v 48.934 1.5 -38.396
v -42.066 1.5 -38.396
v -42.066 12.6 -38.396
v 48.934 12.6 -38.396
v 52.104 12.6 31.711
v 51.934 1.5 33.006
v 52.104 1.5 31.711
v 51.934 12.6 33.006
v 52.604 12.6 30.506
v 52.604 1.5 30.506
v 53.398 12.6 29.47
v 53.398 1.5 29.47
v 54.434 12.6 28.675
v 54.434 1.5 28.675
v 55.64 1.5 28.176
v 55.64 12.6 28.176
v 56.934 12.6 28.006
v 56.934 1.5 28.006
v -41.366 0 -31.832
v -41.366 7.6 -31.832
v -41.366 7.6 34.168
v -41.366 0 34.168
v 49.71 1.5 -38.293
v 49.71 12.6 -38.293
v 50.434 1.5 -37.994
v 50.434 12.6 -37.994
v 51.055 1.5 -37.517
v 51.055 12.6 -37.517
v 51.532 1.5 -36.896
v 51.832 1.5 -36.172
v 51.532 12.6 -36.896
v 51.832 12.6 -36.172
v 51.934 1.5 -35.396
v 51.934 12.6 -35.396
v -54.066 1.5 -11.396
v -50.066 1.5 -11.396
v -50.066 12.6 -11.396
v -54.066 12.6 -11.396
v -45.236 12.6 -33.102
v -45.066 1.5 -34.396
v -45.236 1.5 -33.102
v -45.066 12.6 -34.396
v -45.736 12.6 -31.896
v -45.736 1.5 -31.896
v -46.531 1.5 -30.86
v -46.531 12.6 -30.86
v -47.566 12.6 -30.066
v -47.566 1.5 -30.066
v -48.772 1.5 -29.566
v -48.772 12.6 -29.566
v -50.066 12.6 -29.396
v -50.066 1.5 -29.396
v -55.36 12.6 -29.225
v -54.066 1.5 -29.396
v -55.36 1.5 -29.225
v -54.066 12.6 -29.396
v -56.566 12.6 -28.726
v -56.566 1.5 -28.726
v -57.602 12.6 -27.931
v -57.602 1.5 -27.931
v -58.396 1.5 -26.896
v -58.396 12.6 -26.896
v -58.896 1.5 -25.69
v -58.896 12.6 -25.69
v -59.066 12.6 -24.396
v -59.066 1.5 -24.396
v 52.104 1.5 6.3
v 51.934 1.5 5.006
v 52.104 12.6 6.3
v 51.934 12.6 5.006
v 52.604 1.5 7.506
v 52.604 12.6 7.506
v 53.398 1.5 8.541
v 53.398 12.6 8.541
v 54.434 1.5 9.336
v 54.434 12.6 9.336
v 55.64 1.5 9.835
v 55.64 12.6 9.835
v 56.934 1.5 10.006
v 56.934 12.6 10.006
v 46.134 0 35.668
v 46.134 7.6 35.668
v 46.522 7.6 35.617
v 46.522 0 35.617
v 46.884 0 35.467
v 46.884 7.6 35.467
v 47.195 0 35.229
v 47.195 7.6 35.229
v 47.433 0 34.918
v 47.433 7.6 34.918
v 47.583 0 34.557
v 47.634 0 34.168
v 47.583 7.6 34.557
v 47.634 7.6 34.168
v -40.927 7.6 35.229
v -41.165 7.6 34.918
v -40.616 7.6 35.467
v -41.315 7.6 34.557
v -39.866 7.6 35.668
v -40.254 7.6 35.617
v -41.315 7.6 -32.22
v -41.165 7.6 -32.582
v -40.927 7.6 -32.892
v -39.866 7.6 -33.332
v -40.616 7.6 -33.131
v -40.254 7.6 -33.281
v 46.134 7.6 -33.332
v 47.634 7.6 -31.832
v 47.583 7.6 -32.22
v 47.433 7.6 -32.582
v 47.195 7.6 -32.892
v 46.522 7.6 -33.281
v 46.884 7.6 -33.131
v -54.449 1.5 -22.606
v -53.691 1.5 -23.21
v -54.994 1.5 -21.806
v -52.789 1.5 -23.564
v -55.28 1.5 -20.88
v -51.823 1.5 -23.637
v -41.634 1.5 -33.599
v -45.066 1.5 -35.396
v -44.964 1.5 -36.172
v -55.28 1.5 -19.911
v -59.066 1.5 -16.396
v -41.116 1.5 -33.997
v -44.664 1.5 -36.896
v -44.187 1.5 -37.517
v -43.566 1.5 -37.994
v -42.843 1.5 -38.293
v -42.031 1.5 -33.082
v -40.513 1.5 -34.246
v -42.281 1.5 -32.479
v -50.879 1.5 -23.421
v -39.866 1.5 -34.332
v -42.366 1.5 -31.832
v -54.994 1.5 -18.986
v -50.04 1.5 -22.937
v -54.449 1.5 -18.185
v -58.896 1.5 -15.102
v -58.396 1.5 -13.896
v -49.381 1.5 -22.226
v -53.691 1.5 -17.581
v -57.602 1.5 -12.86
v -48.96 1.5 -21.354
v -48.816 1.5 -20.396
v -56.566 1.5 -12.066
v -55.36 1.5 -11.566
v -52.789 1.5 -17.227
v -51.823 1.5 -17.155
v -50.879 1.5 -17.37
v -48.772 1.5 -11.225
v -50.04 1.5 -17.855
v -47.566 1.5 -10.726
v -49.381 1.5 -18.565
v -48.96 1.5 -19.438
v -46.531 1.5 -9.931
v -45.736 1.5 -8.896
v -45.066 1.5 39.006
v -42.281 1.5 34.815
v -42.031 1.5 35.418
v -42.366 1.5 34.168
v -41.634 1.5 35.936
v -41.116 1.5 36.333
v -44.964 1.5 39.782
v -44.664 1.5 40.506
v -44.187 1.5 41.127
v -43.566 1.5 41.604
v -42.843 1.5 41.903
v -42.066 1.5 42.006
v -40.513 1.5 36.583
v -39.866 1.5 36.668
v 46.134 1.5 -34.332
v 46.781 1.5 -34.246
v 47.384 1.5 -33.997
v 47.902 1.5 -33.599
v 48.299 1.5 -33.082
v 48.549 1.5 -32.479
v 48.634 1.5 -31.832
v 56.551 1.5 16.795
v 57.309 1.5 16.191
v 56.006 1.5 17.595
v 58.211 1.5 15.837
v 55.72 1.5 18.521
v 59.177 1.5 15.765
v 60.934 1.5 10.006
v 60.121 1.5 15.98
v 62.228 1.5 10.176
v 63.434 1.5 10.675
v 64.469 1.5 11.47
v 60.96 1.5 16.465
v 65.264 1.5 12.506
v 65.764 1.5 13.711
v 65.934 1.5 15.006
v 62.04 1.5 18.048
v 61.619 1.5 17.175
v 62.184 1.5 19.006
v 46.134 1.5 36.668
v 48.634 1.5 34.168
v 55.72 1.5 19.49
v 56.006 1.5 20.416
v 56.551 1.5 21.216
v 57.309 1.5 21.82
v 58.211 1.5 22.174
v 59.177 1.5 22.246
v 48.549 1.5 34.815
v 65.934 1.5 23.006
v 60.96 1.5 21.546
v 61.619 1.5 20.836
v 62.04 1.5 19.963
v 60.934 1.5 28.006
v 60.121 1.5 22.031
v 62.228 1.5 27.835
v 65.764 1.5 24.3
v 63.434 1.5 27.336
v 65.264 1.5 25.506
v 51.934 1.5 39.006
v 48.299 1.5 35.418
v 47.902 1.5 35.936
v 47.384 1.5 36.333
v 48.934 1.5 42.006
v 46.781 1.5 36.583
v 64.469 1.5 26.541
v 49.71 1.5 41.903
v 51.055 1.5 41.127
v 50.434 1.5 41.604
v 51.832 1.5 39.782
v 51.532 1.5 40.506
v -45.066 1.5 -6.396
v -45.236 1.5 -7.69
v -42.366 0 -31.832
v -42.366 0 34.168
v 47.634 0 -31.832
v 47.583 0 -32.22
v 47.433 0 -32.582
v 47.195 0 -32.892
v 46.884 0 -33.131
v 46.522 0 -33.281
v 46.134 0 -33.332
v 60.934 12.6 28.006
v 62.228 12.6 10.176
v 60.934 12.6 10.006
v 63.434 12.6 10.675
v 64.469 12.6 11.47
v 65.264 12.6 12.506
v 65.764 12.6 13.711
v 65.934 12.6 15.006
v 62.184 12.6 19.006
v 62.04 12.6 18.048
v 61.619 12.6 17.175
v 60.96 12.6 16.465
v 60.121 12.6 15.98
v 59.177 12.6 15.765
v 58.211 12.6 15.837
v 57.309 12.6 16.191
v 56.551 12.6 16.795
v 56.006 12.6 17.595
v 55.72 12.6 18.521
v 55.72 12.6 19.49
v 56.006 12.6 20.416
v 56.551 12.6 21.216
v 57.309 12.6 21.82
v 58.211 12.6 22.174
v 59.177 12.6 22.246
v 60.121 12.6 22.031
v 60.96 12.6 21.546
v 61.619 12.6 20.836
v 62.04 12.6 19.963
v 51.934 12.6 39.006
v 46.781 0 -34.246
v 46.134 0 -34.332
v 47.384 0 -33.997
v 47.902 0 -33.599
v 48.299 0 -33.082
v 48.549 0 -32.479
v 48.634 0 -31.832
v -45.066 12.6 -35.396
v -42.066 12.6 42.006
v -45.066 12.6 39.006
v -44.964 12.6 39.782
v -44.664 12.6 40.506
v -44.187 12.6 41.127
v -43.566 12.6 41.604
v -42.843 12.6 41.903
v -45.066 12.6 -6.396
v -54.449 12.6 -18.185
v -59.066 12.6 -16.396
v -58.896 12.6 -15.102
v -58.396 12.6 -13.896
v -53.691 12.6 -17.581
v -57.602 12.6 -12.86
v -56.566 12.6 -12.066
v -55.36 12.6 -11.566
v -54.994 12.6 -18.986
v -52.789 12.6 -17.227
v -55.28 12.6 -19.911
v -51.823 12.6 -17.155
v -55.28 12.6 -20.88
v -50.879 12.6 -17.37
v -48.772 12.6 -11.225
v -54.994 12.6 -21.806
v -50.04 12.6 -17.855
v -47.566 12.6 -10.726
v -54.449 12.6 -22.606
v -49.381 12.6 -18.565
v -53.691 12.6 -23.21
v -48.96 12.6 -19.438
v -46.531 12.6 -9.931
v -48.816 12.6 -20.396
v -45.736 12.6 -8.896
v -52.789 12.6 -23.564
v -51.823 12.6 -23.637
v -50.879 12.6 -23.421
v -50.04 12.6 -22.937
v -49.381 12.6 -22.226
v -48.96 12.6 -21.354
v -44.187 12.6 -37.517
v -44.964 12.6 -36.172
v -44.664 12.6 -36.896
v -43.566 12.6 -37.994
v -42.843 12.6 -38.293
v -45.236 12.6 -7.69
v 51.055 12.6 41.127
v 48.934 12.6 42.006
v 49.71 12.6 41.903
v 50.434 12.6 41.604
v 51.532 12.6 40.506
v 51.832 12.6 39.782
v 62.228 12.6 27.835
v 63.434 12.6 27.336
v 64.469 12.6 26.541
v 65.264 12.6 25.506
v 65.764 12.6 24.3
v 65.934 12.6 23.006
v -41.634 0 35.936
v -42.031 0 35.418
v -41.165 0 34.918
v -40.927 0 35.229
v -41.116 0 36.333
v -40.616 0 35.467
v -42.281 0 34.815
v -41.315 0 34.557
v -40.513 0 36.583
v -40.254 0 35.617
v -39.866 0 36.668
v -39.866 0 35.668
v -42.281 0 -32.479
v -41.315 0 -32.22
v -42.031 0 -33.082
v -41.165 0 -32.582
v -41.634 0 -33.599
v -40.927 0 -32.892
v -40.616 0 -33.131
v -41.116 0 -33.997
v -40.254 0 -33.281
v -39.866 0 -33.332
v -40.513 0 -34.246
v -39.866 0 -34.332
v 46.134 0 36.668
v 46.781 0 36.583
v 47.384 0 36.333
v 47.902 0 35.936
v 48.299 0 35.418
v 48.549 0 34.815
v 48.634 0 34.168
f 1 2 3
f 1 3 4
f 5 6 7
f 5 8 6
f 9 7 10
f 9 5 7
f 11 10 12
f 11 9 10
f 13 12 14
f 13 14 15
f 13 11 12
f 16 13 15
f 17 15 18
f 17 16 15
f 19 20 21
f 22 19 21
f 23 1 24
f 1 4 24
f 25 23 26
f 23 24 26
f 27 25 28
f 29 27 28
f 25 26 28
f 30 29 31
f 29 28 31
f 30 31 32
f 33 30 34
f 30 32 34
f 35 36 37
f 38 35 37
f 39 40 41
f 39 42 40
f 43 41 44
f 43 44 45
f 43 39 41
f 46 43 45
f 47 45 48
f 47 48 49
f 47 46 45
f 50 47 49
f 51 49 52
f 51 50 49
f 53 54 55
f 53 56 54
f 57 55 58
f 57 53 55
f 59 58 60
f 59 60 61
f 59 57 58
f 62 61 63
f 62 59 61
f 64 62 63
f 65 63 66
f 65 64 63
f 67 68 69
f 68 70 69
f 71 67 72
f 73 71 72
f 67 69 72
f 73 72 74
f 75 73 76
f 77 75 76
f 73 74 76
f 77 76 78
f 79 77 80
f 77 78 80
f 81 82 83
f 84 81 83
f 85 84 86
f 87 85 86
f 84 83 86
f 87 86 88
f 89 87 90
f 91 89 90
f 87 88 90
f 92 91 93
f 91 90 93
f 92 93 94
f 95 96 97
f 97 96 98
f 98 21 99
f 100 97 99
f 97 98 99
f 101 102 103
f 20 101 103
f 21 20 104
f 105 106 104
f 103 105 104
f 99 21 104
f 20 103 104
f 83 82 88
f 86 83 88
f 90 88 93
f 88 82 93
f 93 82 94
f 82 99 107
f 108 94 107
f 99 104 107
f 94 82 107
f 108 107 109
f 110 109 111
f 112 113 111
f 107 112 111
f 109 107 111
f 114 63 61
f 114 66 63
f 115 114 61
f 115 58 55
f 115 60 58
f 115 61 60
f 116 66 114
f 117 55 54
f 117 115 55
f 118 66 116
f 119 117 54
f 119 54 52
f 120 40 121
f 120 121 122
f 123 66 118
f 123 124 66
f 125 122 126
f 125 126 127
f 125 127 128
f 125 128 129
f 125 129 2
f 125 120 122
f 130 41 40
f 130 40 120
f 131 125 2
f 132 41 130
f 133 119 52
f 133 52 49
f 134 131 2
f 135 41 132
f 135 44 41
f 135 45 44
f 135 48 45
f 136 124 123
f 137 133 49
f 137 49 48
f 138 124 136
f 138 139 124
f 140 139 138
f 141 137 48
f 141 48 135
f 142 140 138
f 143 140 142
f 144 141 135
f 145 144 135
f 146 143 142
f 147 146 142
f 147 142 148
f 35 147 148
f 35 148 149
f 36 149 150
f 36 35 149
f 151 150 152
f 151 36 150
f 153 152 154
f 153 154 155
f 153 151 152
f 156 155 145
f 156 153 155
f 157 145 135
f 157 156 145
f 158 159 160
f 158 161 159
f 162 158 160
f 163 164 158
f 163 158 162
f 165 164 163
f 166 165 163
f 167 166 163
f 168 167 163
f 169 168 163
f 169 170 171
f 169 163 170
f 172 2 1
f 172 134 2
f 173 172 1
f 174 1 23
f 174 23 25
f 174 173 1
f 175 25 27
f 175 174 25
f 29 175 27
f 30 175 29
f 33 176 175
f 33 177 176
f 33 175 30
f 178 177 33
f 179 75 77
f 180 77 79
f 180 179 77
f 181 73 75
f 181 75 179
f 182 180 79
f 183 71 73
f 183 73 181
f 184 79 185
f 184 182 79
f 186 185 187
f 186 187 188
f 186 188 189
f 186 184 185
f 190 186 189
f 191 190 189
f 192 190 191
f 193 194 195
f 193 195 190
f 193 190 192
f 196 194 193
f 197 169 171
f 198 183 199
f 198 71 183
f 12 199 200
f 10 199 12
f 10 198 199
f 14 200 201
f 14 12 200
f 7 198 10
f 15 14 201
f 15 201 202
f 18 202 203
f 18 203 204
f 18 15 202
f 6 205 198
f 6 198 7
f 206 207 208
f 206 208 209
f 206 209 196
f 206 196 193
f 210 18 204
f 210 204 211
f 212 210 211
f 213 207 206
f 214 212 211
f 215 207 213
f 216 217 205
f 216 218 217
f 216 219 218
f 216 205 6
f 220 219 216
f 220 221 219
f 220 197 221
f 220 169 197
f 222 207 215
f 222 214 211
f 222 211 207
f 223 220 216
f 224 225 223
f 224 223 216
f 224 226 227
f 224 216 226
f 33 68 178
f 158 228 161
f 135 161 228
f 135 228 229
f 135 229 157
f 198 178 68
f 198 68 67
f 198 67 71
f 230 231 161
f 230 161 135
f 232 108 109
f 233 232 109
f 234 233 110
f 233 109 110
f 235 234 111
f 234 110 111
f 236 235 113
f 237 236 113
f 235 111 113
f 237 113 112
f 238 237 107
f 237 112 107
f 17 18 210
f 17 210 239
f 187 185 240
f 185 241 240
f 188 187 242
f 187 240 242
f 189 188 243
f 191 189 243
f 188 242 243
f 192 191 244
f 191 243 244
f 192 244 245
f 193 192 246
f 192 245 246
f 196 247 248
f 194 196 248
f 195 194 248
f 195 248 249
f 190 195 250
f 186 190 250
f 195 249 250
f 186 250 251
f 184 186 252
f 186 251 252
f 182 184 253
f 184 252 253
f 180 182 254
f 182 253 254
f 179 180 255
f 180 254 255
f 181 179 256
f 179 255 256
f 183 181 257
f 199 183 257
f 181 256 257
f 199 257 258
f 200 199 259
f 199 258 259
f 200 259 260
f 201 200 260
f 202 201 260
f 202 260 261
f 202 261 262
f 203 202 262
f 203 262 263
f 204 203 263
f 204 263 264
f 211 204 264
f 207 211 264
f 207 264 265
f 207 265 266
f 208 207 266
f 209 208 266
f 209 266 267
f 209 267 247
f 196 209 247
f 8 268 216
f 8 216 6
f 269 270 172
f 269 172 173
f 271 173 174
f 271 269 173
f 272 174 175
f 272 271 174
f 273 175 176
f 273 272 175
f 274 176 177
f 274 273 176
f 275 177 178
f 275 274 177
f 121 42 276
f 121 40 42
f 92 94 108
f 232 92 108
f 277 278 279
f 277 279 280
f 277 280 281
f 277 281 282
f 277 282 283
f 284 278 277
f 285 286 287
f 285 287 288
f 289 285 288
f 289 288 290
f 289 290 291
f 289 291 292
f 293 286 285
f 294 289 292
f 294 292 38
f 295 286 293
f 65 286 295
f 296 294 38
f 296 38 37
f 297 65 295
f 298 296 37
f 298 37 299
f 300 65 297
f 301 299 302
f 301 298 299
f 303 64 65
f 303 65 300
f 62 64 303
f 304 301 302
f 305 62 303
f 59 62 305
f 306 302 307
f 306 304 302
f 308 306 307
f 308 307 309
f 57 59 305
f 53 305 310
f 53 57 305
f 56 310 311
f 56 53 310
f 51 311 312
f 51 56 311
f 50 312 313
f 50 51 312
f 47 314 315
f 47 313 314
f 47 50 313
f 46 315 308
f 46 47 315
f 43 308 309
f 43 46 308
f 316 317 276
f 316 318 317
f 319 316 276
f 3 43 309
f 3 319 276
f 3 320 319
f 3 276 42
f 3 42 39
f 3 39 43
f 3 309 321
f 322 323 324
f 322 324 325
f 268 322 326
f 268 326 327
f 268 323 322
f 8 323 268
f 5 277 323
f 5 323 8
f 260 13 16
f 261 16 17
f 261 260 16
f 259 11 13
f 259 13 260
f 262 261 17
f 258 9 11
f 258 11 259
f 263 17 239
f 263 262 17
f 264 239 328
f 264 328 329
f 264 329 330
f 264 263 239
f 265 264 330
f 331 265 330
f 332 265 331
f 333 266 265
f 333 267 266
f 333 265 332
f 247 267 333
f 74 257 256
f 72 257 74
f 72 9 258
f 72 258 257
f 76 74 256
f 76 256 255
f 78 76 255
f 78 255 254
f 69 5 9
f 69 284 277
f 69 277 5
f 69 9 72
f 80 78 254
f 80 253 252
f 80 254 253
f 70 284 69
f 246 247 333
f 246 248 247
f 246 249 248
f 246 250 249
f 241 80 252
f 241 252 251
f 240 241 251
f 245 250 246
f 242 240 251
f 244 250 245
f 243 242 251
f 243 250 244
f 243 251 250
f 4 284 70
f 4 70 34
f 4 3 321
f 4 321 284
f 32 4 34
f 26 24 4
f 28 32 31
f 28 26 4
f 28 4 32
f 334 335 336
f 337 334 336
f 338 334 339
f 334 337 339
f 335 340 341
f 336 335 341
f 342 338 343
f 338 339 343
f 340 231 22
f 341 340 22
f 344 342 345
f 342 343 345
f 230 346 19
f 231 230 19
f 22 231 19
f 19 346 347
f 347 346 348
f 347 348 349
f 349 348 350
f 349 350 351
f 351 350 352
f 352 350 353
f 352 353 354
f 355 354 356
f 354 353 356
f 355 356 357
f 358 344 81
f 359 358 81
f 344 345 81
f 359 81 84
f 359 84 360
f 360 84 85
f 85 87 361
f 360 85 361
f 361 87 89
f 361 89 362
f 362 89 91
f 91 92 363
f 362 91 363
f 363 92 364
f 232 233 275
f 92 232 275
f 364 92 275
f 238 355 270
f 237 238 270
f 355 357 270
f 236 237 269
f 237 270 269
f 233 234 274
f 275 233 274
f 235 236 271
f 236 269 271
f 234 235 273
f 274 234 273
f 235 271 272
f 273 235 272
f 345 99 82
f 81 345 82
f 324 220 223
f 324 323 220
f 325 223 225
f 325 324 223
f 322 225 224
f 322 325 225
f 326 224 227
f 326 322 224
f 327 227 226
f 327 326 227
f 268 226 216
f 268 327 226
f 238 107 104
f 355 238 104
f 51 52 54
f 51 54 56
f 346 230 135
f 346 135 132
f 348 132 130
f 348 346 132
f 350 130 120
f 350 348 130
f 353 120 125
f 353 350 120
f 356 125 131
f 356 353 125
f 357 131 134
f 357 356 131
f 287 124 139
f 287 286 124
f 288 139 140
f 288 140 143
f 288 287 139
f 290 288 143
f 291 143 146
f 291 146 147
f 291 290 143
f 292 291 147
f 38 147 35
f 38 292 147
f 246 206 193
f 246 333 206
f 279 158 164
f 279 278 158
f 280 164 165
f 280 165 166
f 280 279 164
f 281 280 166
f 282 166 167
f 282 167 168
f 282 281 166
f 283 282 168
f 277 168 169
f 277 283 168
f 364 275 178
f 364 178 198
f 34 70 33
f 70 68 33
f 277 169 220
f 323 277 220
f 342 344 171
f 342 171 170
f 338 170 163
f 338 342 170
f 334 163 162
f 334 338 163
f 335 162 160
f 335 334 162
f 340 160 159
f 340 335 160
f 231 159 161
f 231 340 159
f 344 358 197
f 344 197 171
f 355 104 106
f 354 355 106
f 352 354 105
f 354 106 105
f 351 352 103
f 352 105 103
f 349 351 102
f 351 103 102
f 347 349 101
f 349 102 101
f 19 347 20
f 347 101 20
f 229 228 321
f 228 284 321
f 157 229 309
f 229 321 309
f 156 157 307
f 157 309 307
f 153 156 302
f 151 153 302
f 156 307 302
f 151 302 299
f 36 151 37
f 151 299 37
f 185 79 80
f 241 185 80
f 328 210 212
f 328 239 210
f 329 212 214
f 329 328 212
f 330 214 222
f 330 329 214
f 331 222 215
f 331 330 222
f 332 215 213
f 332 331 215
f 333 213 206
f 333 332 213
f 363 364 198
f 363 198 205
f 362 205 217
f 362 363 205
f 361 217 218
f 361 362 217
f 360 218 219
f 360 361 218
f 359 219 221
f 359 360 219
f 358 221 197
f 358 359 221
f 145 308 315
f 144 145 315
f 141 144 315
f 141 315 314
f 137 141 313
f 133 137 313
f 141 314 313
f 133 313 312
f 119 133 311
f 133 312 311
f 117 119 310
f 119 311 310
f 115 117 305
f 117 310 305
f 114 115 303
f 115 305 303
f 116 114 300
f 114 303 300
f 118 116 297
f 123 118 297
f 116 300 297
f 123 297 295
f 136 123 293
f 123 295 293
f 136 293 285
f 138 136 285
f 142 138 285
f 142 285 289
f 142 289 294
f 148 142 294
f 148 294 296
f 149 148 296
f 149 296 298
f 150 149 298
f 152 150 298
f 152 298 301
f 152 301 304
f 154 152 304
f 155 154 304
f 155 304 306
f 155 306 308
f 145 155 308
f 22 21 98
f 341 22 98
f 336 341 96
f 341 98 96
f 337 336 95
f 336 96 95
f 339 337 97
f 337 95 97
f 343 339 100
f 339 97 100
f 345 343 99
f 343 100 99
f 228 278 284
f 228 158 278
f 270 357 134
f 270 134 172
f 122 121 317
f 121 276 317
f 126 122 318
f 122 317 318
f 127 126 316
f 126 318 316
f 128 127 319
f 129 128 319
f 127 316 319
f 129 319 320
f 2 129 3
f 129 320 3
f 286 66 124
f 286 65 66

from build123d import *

# Parameters (mm, degrees)
SKETCH1_W           = 97
SKETCH1_H           = 80.401218893
BOSS_EXTRUDE1_DEPTH = 12.6
CUT_EXTRUDE2_START  = -5
CUT_EXTRUDE2_DEPTH  = 10
SKETCH6_W           = 97
SKETCH6_H           = 80.401218893
CUT_EXTRUDE3_DEPTH  = 1.5
FILLET1_R           = 3
SKETCH7_W           = 18
SKETCH7_H           = 11.1
BOSS_EXTRUDE2_DEPTH = 14
SKETCH8_W           = 18
SKETCH8_H           = 11.1
BOSS_EXTRUDE3_DEPTH = 14
FILLET2_R           = 5
SKETCH9_R           = 3.25
CUT_EXTRUDE4_DEPTH  = 13.6


with BuildPart() as part:
    # Sketch1 → Boss-Extrude1 (new body)
    with BuildSketch(Plane(origin=(0, 0, 0), x_dir=(1, 0, 0), z_dir=(0, 1, 0))):
        with Locations((3.433898335, -1.804923378)):
            Rectangle(SKETCH1_W, SKETCH1_H)
    extrude(amount=BOSS_EXTRUDE1_DEPTH)

    # Sketch3 → Cut-Extrude2 (cut)
    with BuildSketch(Plane(origin=(0, 12.6, 0), x_dir=(1, 0, 0), z_dir=(0, 1, 0)).offset(CUT_EXTRUDE2_START)):
        with BuildLine():
            Line((-41.366101665, 31.831649434), (-41.366101665, -34.168350566))
            ThreePointArc((-41.366101665, -34.168350566), (-40.926761836, -35.229010737), (-39.866101665, -35.668350566))
            Line((-39.866101665, -35.668350566), (46.133898335, -35.668350566))
            ThreePointArc((46.133898335, -35.668350566), (47.194558507, -35.229010737), (47.633898335, -34.168350566))
            Line((47.633898335, -34.168350566), (47.633898335, 31.831649434))
            ThreePointArc((47.633898335, 31.831649434), (47.194558507, 32.892309606), (46.133898335, 33.331649434))
            Line((46.133898335, 33.331649434), (-39.866101665, 33.331649434))
            ThreePointArc((-39.866101665, 33.331649434), (-40.926761836, 32.892309606), (-41.366101665, 31.831649434))
        make_face()
    extrude(amount=-CUT_EXTRUDE2_DEPTH, mode=Mode.SUBTRACT)

    # Sketch6 → Cut-Extrude3 (cut)
    with BuildSketch(Plane.XZ):
        with Locations((3.433898335, 1.804923378)):
            Rectangle(SKETCH6_W, SKETCH6_H)
        with BuildLine():
            Line((-39.866101665, -34.331649434), (46.133898335, -34.331649434))
            ThreePointArc((46.133898335, -34.331649434), (47.901665288, -33.599416387), (48.633898335, -31.831649434))
            Line((48.633898335, -31.831649434), (48.633898335, 34.168350566))
            ThreePointArc((48.633898335, 34.168350566), (47.901665288, 35.936117519), (46.133898335, 36.668350566))
            Line((46.133898335, 36.668350566), (-39.866101665, 36.668350566))
            ThreePointArc((-39.866101665, 36.668350566), (-41.633868617, 35.936117519), (-42.366101665, 34.168350566))
            Line((-42.366101665, 34.168350566), (-42.366101665, -31.831649434))
            ThreePointArc((-42.366101665, -31.831649434), (-41.633868617, -33.599416387), (-39.866101665, -34.331649434))
        make_face(mode=Mode.SUBTRACT)
    extrude(amount=-CUT_EXTRUDE3_DEPTH, mode=Mode.SUBTRACT)

    # Fillet1
    fillet1_edges = [part.edges().sort_by_distance(p)[0] for p in [
        (51.933898335, 7.05, 42.005532825),
        (-45.066101665, 7.05, 42.005532825),
        (-45.066101665, 7.05, -38.395686068),
        (51.933898335, 7.05, -38.395686068),
    ]]
    fillet(fillet1_edges, radius=FILLET1_R)

    # Sketch7 → Boss-Extrude2 (add)
    with BuildSketch(Plane.ZY.offset(45.066101665)):
        with Locations((-20.395686068, 7.05)):
            Rectangle(SKETCH7_W, SKETCH7_H)
    extrude(amount=BOSS_EXTRUDE2_DEPTH)

    # Sketch8 → Boss-Extrude3 (add)
    with BuildSketch(Plane(origin=(51.933898335, 0, 0), x_dir=(0, 0, -1), z_dir=(1, 0, 0))):
        with Locations((-19.005532825, 7.05)):
            Rectangle(SKETCH8_W, SKETCH8_H)
    extrude(amount=BOSS_EXTRUDE3_DEPTH)

    # Fillet2
    fillet2_edges = [part.edges().sort_by_distance(p)[0] for p in [
        (-45.066101665, 7.05, -11.395686068),
        (-45.066101665, 7.05, -29.395686068),
        (-59.066101665, 7.05, -11.395686068),
        (-59.066101665, 7.05, -29.395686068),
        (51.933898335, 7.05, 10.005532825),
        (51.933898335, 7.05, 28.005532825),
        (65.933898335, 7.05, 10.005532825),
        (65.933898335, 7.05, 28.005532825),
    ]]
    fillet(fillet2_edges, radius=FILLET2_R)

    # Sketch9 → Cut-Extrude4 (cut, through all)
    with BuildSketch(Plane(origin=(0, 12.6, 0), x_dir=(1, 0, 0), z_dir=(0, 1, 0))):
        with Locations((58.933898335, -19.005532825)):
            Circle(SKETCH9_R)
        with Locations((-52.066101665, 20.395686068)):
            Circle(SKETCH9_R)
    extrude(amount=-CUT_EXTRUDE4_DEPTH, mode=Mode.SUBTRACT)


solid = part.part
